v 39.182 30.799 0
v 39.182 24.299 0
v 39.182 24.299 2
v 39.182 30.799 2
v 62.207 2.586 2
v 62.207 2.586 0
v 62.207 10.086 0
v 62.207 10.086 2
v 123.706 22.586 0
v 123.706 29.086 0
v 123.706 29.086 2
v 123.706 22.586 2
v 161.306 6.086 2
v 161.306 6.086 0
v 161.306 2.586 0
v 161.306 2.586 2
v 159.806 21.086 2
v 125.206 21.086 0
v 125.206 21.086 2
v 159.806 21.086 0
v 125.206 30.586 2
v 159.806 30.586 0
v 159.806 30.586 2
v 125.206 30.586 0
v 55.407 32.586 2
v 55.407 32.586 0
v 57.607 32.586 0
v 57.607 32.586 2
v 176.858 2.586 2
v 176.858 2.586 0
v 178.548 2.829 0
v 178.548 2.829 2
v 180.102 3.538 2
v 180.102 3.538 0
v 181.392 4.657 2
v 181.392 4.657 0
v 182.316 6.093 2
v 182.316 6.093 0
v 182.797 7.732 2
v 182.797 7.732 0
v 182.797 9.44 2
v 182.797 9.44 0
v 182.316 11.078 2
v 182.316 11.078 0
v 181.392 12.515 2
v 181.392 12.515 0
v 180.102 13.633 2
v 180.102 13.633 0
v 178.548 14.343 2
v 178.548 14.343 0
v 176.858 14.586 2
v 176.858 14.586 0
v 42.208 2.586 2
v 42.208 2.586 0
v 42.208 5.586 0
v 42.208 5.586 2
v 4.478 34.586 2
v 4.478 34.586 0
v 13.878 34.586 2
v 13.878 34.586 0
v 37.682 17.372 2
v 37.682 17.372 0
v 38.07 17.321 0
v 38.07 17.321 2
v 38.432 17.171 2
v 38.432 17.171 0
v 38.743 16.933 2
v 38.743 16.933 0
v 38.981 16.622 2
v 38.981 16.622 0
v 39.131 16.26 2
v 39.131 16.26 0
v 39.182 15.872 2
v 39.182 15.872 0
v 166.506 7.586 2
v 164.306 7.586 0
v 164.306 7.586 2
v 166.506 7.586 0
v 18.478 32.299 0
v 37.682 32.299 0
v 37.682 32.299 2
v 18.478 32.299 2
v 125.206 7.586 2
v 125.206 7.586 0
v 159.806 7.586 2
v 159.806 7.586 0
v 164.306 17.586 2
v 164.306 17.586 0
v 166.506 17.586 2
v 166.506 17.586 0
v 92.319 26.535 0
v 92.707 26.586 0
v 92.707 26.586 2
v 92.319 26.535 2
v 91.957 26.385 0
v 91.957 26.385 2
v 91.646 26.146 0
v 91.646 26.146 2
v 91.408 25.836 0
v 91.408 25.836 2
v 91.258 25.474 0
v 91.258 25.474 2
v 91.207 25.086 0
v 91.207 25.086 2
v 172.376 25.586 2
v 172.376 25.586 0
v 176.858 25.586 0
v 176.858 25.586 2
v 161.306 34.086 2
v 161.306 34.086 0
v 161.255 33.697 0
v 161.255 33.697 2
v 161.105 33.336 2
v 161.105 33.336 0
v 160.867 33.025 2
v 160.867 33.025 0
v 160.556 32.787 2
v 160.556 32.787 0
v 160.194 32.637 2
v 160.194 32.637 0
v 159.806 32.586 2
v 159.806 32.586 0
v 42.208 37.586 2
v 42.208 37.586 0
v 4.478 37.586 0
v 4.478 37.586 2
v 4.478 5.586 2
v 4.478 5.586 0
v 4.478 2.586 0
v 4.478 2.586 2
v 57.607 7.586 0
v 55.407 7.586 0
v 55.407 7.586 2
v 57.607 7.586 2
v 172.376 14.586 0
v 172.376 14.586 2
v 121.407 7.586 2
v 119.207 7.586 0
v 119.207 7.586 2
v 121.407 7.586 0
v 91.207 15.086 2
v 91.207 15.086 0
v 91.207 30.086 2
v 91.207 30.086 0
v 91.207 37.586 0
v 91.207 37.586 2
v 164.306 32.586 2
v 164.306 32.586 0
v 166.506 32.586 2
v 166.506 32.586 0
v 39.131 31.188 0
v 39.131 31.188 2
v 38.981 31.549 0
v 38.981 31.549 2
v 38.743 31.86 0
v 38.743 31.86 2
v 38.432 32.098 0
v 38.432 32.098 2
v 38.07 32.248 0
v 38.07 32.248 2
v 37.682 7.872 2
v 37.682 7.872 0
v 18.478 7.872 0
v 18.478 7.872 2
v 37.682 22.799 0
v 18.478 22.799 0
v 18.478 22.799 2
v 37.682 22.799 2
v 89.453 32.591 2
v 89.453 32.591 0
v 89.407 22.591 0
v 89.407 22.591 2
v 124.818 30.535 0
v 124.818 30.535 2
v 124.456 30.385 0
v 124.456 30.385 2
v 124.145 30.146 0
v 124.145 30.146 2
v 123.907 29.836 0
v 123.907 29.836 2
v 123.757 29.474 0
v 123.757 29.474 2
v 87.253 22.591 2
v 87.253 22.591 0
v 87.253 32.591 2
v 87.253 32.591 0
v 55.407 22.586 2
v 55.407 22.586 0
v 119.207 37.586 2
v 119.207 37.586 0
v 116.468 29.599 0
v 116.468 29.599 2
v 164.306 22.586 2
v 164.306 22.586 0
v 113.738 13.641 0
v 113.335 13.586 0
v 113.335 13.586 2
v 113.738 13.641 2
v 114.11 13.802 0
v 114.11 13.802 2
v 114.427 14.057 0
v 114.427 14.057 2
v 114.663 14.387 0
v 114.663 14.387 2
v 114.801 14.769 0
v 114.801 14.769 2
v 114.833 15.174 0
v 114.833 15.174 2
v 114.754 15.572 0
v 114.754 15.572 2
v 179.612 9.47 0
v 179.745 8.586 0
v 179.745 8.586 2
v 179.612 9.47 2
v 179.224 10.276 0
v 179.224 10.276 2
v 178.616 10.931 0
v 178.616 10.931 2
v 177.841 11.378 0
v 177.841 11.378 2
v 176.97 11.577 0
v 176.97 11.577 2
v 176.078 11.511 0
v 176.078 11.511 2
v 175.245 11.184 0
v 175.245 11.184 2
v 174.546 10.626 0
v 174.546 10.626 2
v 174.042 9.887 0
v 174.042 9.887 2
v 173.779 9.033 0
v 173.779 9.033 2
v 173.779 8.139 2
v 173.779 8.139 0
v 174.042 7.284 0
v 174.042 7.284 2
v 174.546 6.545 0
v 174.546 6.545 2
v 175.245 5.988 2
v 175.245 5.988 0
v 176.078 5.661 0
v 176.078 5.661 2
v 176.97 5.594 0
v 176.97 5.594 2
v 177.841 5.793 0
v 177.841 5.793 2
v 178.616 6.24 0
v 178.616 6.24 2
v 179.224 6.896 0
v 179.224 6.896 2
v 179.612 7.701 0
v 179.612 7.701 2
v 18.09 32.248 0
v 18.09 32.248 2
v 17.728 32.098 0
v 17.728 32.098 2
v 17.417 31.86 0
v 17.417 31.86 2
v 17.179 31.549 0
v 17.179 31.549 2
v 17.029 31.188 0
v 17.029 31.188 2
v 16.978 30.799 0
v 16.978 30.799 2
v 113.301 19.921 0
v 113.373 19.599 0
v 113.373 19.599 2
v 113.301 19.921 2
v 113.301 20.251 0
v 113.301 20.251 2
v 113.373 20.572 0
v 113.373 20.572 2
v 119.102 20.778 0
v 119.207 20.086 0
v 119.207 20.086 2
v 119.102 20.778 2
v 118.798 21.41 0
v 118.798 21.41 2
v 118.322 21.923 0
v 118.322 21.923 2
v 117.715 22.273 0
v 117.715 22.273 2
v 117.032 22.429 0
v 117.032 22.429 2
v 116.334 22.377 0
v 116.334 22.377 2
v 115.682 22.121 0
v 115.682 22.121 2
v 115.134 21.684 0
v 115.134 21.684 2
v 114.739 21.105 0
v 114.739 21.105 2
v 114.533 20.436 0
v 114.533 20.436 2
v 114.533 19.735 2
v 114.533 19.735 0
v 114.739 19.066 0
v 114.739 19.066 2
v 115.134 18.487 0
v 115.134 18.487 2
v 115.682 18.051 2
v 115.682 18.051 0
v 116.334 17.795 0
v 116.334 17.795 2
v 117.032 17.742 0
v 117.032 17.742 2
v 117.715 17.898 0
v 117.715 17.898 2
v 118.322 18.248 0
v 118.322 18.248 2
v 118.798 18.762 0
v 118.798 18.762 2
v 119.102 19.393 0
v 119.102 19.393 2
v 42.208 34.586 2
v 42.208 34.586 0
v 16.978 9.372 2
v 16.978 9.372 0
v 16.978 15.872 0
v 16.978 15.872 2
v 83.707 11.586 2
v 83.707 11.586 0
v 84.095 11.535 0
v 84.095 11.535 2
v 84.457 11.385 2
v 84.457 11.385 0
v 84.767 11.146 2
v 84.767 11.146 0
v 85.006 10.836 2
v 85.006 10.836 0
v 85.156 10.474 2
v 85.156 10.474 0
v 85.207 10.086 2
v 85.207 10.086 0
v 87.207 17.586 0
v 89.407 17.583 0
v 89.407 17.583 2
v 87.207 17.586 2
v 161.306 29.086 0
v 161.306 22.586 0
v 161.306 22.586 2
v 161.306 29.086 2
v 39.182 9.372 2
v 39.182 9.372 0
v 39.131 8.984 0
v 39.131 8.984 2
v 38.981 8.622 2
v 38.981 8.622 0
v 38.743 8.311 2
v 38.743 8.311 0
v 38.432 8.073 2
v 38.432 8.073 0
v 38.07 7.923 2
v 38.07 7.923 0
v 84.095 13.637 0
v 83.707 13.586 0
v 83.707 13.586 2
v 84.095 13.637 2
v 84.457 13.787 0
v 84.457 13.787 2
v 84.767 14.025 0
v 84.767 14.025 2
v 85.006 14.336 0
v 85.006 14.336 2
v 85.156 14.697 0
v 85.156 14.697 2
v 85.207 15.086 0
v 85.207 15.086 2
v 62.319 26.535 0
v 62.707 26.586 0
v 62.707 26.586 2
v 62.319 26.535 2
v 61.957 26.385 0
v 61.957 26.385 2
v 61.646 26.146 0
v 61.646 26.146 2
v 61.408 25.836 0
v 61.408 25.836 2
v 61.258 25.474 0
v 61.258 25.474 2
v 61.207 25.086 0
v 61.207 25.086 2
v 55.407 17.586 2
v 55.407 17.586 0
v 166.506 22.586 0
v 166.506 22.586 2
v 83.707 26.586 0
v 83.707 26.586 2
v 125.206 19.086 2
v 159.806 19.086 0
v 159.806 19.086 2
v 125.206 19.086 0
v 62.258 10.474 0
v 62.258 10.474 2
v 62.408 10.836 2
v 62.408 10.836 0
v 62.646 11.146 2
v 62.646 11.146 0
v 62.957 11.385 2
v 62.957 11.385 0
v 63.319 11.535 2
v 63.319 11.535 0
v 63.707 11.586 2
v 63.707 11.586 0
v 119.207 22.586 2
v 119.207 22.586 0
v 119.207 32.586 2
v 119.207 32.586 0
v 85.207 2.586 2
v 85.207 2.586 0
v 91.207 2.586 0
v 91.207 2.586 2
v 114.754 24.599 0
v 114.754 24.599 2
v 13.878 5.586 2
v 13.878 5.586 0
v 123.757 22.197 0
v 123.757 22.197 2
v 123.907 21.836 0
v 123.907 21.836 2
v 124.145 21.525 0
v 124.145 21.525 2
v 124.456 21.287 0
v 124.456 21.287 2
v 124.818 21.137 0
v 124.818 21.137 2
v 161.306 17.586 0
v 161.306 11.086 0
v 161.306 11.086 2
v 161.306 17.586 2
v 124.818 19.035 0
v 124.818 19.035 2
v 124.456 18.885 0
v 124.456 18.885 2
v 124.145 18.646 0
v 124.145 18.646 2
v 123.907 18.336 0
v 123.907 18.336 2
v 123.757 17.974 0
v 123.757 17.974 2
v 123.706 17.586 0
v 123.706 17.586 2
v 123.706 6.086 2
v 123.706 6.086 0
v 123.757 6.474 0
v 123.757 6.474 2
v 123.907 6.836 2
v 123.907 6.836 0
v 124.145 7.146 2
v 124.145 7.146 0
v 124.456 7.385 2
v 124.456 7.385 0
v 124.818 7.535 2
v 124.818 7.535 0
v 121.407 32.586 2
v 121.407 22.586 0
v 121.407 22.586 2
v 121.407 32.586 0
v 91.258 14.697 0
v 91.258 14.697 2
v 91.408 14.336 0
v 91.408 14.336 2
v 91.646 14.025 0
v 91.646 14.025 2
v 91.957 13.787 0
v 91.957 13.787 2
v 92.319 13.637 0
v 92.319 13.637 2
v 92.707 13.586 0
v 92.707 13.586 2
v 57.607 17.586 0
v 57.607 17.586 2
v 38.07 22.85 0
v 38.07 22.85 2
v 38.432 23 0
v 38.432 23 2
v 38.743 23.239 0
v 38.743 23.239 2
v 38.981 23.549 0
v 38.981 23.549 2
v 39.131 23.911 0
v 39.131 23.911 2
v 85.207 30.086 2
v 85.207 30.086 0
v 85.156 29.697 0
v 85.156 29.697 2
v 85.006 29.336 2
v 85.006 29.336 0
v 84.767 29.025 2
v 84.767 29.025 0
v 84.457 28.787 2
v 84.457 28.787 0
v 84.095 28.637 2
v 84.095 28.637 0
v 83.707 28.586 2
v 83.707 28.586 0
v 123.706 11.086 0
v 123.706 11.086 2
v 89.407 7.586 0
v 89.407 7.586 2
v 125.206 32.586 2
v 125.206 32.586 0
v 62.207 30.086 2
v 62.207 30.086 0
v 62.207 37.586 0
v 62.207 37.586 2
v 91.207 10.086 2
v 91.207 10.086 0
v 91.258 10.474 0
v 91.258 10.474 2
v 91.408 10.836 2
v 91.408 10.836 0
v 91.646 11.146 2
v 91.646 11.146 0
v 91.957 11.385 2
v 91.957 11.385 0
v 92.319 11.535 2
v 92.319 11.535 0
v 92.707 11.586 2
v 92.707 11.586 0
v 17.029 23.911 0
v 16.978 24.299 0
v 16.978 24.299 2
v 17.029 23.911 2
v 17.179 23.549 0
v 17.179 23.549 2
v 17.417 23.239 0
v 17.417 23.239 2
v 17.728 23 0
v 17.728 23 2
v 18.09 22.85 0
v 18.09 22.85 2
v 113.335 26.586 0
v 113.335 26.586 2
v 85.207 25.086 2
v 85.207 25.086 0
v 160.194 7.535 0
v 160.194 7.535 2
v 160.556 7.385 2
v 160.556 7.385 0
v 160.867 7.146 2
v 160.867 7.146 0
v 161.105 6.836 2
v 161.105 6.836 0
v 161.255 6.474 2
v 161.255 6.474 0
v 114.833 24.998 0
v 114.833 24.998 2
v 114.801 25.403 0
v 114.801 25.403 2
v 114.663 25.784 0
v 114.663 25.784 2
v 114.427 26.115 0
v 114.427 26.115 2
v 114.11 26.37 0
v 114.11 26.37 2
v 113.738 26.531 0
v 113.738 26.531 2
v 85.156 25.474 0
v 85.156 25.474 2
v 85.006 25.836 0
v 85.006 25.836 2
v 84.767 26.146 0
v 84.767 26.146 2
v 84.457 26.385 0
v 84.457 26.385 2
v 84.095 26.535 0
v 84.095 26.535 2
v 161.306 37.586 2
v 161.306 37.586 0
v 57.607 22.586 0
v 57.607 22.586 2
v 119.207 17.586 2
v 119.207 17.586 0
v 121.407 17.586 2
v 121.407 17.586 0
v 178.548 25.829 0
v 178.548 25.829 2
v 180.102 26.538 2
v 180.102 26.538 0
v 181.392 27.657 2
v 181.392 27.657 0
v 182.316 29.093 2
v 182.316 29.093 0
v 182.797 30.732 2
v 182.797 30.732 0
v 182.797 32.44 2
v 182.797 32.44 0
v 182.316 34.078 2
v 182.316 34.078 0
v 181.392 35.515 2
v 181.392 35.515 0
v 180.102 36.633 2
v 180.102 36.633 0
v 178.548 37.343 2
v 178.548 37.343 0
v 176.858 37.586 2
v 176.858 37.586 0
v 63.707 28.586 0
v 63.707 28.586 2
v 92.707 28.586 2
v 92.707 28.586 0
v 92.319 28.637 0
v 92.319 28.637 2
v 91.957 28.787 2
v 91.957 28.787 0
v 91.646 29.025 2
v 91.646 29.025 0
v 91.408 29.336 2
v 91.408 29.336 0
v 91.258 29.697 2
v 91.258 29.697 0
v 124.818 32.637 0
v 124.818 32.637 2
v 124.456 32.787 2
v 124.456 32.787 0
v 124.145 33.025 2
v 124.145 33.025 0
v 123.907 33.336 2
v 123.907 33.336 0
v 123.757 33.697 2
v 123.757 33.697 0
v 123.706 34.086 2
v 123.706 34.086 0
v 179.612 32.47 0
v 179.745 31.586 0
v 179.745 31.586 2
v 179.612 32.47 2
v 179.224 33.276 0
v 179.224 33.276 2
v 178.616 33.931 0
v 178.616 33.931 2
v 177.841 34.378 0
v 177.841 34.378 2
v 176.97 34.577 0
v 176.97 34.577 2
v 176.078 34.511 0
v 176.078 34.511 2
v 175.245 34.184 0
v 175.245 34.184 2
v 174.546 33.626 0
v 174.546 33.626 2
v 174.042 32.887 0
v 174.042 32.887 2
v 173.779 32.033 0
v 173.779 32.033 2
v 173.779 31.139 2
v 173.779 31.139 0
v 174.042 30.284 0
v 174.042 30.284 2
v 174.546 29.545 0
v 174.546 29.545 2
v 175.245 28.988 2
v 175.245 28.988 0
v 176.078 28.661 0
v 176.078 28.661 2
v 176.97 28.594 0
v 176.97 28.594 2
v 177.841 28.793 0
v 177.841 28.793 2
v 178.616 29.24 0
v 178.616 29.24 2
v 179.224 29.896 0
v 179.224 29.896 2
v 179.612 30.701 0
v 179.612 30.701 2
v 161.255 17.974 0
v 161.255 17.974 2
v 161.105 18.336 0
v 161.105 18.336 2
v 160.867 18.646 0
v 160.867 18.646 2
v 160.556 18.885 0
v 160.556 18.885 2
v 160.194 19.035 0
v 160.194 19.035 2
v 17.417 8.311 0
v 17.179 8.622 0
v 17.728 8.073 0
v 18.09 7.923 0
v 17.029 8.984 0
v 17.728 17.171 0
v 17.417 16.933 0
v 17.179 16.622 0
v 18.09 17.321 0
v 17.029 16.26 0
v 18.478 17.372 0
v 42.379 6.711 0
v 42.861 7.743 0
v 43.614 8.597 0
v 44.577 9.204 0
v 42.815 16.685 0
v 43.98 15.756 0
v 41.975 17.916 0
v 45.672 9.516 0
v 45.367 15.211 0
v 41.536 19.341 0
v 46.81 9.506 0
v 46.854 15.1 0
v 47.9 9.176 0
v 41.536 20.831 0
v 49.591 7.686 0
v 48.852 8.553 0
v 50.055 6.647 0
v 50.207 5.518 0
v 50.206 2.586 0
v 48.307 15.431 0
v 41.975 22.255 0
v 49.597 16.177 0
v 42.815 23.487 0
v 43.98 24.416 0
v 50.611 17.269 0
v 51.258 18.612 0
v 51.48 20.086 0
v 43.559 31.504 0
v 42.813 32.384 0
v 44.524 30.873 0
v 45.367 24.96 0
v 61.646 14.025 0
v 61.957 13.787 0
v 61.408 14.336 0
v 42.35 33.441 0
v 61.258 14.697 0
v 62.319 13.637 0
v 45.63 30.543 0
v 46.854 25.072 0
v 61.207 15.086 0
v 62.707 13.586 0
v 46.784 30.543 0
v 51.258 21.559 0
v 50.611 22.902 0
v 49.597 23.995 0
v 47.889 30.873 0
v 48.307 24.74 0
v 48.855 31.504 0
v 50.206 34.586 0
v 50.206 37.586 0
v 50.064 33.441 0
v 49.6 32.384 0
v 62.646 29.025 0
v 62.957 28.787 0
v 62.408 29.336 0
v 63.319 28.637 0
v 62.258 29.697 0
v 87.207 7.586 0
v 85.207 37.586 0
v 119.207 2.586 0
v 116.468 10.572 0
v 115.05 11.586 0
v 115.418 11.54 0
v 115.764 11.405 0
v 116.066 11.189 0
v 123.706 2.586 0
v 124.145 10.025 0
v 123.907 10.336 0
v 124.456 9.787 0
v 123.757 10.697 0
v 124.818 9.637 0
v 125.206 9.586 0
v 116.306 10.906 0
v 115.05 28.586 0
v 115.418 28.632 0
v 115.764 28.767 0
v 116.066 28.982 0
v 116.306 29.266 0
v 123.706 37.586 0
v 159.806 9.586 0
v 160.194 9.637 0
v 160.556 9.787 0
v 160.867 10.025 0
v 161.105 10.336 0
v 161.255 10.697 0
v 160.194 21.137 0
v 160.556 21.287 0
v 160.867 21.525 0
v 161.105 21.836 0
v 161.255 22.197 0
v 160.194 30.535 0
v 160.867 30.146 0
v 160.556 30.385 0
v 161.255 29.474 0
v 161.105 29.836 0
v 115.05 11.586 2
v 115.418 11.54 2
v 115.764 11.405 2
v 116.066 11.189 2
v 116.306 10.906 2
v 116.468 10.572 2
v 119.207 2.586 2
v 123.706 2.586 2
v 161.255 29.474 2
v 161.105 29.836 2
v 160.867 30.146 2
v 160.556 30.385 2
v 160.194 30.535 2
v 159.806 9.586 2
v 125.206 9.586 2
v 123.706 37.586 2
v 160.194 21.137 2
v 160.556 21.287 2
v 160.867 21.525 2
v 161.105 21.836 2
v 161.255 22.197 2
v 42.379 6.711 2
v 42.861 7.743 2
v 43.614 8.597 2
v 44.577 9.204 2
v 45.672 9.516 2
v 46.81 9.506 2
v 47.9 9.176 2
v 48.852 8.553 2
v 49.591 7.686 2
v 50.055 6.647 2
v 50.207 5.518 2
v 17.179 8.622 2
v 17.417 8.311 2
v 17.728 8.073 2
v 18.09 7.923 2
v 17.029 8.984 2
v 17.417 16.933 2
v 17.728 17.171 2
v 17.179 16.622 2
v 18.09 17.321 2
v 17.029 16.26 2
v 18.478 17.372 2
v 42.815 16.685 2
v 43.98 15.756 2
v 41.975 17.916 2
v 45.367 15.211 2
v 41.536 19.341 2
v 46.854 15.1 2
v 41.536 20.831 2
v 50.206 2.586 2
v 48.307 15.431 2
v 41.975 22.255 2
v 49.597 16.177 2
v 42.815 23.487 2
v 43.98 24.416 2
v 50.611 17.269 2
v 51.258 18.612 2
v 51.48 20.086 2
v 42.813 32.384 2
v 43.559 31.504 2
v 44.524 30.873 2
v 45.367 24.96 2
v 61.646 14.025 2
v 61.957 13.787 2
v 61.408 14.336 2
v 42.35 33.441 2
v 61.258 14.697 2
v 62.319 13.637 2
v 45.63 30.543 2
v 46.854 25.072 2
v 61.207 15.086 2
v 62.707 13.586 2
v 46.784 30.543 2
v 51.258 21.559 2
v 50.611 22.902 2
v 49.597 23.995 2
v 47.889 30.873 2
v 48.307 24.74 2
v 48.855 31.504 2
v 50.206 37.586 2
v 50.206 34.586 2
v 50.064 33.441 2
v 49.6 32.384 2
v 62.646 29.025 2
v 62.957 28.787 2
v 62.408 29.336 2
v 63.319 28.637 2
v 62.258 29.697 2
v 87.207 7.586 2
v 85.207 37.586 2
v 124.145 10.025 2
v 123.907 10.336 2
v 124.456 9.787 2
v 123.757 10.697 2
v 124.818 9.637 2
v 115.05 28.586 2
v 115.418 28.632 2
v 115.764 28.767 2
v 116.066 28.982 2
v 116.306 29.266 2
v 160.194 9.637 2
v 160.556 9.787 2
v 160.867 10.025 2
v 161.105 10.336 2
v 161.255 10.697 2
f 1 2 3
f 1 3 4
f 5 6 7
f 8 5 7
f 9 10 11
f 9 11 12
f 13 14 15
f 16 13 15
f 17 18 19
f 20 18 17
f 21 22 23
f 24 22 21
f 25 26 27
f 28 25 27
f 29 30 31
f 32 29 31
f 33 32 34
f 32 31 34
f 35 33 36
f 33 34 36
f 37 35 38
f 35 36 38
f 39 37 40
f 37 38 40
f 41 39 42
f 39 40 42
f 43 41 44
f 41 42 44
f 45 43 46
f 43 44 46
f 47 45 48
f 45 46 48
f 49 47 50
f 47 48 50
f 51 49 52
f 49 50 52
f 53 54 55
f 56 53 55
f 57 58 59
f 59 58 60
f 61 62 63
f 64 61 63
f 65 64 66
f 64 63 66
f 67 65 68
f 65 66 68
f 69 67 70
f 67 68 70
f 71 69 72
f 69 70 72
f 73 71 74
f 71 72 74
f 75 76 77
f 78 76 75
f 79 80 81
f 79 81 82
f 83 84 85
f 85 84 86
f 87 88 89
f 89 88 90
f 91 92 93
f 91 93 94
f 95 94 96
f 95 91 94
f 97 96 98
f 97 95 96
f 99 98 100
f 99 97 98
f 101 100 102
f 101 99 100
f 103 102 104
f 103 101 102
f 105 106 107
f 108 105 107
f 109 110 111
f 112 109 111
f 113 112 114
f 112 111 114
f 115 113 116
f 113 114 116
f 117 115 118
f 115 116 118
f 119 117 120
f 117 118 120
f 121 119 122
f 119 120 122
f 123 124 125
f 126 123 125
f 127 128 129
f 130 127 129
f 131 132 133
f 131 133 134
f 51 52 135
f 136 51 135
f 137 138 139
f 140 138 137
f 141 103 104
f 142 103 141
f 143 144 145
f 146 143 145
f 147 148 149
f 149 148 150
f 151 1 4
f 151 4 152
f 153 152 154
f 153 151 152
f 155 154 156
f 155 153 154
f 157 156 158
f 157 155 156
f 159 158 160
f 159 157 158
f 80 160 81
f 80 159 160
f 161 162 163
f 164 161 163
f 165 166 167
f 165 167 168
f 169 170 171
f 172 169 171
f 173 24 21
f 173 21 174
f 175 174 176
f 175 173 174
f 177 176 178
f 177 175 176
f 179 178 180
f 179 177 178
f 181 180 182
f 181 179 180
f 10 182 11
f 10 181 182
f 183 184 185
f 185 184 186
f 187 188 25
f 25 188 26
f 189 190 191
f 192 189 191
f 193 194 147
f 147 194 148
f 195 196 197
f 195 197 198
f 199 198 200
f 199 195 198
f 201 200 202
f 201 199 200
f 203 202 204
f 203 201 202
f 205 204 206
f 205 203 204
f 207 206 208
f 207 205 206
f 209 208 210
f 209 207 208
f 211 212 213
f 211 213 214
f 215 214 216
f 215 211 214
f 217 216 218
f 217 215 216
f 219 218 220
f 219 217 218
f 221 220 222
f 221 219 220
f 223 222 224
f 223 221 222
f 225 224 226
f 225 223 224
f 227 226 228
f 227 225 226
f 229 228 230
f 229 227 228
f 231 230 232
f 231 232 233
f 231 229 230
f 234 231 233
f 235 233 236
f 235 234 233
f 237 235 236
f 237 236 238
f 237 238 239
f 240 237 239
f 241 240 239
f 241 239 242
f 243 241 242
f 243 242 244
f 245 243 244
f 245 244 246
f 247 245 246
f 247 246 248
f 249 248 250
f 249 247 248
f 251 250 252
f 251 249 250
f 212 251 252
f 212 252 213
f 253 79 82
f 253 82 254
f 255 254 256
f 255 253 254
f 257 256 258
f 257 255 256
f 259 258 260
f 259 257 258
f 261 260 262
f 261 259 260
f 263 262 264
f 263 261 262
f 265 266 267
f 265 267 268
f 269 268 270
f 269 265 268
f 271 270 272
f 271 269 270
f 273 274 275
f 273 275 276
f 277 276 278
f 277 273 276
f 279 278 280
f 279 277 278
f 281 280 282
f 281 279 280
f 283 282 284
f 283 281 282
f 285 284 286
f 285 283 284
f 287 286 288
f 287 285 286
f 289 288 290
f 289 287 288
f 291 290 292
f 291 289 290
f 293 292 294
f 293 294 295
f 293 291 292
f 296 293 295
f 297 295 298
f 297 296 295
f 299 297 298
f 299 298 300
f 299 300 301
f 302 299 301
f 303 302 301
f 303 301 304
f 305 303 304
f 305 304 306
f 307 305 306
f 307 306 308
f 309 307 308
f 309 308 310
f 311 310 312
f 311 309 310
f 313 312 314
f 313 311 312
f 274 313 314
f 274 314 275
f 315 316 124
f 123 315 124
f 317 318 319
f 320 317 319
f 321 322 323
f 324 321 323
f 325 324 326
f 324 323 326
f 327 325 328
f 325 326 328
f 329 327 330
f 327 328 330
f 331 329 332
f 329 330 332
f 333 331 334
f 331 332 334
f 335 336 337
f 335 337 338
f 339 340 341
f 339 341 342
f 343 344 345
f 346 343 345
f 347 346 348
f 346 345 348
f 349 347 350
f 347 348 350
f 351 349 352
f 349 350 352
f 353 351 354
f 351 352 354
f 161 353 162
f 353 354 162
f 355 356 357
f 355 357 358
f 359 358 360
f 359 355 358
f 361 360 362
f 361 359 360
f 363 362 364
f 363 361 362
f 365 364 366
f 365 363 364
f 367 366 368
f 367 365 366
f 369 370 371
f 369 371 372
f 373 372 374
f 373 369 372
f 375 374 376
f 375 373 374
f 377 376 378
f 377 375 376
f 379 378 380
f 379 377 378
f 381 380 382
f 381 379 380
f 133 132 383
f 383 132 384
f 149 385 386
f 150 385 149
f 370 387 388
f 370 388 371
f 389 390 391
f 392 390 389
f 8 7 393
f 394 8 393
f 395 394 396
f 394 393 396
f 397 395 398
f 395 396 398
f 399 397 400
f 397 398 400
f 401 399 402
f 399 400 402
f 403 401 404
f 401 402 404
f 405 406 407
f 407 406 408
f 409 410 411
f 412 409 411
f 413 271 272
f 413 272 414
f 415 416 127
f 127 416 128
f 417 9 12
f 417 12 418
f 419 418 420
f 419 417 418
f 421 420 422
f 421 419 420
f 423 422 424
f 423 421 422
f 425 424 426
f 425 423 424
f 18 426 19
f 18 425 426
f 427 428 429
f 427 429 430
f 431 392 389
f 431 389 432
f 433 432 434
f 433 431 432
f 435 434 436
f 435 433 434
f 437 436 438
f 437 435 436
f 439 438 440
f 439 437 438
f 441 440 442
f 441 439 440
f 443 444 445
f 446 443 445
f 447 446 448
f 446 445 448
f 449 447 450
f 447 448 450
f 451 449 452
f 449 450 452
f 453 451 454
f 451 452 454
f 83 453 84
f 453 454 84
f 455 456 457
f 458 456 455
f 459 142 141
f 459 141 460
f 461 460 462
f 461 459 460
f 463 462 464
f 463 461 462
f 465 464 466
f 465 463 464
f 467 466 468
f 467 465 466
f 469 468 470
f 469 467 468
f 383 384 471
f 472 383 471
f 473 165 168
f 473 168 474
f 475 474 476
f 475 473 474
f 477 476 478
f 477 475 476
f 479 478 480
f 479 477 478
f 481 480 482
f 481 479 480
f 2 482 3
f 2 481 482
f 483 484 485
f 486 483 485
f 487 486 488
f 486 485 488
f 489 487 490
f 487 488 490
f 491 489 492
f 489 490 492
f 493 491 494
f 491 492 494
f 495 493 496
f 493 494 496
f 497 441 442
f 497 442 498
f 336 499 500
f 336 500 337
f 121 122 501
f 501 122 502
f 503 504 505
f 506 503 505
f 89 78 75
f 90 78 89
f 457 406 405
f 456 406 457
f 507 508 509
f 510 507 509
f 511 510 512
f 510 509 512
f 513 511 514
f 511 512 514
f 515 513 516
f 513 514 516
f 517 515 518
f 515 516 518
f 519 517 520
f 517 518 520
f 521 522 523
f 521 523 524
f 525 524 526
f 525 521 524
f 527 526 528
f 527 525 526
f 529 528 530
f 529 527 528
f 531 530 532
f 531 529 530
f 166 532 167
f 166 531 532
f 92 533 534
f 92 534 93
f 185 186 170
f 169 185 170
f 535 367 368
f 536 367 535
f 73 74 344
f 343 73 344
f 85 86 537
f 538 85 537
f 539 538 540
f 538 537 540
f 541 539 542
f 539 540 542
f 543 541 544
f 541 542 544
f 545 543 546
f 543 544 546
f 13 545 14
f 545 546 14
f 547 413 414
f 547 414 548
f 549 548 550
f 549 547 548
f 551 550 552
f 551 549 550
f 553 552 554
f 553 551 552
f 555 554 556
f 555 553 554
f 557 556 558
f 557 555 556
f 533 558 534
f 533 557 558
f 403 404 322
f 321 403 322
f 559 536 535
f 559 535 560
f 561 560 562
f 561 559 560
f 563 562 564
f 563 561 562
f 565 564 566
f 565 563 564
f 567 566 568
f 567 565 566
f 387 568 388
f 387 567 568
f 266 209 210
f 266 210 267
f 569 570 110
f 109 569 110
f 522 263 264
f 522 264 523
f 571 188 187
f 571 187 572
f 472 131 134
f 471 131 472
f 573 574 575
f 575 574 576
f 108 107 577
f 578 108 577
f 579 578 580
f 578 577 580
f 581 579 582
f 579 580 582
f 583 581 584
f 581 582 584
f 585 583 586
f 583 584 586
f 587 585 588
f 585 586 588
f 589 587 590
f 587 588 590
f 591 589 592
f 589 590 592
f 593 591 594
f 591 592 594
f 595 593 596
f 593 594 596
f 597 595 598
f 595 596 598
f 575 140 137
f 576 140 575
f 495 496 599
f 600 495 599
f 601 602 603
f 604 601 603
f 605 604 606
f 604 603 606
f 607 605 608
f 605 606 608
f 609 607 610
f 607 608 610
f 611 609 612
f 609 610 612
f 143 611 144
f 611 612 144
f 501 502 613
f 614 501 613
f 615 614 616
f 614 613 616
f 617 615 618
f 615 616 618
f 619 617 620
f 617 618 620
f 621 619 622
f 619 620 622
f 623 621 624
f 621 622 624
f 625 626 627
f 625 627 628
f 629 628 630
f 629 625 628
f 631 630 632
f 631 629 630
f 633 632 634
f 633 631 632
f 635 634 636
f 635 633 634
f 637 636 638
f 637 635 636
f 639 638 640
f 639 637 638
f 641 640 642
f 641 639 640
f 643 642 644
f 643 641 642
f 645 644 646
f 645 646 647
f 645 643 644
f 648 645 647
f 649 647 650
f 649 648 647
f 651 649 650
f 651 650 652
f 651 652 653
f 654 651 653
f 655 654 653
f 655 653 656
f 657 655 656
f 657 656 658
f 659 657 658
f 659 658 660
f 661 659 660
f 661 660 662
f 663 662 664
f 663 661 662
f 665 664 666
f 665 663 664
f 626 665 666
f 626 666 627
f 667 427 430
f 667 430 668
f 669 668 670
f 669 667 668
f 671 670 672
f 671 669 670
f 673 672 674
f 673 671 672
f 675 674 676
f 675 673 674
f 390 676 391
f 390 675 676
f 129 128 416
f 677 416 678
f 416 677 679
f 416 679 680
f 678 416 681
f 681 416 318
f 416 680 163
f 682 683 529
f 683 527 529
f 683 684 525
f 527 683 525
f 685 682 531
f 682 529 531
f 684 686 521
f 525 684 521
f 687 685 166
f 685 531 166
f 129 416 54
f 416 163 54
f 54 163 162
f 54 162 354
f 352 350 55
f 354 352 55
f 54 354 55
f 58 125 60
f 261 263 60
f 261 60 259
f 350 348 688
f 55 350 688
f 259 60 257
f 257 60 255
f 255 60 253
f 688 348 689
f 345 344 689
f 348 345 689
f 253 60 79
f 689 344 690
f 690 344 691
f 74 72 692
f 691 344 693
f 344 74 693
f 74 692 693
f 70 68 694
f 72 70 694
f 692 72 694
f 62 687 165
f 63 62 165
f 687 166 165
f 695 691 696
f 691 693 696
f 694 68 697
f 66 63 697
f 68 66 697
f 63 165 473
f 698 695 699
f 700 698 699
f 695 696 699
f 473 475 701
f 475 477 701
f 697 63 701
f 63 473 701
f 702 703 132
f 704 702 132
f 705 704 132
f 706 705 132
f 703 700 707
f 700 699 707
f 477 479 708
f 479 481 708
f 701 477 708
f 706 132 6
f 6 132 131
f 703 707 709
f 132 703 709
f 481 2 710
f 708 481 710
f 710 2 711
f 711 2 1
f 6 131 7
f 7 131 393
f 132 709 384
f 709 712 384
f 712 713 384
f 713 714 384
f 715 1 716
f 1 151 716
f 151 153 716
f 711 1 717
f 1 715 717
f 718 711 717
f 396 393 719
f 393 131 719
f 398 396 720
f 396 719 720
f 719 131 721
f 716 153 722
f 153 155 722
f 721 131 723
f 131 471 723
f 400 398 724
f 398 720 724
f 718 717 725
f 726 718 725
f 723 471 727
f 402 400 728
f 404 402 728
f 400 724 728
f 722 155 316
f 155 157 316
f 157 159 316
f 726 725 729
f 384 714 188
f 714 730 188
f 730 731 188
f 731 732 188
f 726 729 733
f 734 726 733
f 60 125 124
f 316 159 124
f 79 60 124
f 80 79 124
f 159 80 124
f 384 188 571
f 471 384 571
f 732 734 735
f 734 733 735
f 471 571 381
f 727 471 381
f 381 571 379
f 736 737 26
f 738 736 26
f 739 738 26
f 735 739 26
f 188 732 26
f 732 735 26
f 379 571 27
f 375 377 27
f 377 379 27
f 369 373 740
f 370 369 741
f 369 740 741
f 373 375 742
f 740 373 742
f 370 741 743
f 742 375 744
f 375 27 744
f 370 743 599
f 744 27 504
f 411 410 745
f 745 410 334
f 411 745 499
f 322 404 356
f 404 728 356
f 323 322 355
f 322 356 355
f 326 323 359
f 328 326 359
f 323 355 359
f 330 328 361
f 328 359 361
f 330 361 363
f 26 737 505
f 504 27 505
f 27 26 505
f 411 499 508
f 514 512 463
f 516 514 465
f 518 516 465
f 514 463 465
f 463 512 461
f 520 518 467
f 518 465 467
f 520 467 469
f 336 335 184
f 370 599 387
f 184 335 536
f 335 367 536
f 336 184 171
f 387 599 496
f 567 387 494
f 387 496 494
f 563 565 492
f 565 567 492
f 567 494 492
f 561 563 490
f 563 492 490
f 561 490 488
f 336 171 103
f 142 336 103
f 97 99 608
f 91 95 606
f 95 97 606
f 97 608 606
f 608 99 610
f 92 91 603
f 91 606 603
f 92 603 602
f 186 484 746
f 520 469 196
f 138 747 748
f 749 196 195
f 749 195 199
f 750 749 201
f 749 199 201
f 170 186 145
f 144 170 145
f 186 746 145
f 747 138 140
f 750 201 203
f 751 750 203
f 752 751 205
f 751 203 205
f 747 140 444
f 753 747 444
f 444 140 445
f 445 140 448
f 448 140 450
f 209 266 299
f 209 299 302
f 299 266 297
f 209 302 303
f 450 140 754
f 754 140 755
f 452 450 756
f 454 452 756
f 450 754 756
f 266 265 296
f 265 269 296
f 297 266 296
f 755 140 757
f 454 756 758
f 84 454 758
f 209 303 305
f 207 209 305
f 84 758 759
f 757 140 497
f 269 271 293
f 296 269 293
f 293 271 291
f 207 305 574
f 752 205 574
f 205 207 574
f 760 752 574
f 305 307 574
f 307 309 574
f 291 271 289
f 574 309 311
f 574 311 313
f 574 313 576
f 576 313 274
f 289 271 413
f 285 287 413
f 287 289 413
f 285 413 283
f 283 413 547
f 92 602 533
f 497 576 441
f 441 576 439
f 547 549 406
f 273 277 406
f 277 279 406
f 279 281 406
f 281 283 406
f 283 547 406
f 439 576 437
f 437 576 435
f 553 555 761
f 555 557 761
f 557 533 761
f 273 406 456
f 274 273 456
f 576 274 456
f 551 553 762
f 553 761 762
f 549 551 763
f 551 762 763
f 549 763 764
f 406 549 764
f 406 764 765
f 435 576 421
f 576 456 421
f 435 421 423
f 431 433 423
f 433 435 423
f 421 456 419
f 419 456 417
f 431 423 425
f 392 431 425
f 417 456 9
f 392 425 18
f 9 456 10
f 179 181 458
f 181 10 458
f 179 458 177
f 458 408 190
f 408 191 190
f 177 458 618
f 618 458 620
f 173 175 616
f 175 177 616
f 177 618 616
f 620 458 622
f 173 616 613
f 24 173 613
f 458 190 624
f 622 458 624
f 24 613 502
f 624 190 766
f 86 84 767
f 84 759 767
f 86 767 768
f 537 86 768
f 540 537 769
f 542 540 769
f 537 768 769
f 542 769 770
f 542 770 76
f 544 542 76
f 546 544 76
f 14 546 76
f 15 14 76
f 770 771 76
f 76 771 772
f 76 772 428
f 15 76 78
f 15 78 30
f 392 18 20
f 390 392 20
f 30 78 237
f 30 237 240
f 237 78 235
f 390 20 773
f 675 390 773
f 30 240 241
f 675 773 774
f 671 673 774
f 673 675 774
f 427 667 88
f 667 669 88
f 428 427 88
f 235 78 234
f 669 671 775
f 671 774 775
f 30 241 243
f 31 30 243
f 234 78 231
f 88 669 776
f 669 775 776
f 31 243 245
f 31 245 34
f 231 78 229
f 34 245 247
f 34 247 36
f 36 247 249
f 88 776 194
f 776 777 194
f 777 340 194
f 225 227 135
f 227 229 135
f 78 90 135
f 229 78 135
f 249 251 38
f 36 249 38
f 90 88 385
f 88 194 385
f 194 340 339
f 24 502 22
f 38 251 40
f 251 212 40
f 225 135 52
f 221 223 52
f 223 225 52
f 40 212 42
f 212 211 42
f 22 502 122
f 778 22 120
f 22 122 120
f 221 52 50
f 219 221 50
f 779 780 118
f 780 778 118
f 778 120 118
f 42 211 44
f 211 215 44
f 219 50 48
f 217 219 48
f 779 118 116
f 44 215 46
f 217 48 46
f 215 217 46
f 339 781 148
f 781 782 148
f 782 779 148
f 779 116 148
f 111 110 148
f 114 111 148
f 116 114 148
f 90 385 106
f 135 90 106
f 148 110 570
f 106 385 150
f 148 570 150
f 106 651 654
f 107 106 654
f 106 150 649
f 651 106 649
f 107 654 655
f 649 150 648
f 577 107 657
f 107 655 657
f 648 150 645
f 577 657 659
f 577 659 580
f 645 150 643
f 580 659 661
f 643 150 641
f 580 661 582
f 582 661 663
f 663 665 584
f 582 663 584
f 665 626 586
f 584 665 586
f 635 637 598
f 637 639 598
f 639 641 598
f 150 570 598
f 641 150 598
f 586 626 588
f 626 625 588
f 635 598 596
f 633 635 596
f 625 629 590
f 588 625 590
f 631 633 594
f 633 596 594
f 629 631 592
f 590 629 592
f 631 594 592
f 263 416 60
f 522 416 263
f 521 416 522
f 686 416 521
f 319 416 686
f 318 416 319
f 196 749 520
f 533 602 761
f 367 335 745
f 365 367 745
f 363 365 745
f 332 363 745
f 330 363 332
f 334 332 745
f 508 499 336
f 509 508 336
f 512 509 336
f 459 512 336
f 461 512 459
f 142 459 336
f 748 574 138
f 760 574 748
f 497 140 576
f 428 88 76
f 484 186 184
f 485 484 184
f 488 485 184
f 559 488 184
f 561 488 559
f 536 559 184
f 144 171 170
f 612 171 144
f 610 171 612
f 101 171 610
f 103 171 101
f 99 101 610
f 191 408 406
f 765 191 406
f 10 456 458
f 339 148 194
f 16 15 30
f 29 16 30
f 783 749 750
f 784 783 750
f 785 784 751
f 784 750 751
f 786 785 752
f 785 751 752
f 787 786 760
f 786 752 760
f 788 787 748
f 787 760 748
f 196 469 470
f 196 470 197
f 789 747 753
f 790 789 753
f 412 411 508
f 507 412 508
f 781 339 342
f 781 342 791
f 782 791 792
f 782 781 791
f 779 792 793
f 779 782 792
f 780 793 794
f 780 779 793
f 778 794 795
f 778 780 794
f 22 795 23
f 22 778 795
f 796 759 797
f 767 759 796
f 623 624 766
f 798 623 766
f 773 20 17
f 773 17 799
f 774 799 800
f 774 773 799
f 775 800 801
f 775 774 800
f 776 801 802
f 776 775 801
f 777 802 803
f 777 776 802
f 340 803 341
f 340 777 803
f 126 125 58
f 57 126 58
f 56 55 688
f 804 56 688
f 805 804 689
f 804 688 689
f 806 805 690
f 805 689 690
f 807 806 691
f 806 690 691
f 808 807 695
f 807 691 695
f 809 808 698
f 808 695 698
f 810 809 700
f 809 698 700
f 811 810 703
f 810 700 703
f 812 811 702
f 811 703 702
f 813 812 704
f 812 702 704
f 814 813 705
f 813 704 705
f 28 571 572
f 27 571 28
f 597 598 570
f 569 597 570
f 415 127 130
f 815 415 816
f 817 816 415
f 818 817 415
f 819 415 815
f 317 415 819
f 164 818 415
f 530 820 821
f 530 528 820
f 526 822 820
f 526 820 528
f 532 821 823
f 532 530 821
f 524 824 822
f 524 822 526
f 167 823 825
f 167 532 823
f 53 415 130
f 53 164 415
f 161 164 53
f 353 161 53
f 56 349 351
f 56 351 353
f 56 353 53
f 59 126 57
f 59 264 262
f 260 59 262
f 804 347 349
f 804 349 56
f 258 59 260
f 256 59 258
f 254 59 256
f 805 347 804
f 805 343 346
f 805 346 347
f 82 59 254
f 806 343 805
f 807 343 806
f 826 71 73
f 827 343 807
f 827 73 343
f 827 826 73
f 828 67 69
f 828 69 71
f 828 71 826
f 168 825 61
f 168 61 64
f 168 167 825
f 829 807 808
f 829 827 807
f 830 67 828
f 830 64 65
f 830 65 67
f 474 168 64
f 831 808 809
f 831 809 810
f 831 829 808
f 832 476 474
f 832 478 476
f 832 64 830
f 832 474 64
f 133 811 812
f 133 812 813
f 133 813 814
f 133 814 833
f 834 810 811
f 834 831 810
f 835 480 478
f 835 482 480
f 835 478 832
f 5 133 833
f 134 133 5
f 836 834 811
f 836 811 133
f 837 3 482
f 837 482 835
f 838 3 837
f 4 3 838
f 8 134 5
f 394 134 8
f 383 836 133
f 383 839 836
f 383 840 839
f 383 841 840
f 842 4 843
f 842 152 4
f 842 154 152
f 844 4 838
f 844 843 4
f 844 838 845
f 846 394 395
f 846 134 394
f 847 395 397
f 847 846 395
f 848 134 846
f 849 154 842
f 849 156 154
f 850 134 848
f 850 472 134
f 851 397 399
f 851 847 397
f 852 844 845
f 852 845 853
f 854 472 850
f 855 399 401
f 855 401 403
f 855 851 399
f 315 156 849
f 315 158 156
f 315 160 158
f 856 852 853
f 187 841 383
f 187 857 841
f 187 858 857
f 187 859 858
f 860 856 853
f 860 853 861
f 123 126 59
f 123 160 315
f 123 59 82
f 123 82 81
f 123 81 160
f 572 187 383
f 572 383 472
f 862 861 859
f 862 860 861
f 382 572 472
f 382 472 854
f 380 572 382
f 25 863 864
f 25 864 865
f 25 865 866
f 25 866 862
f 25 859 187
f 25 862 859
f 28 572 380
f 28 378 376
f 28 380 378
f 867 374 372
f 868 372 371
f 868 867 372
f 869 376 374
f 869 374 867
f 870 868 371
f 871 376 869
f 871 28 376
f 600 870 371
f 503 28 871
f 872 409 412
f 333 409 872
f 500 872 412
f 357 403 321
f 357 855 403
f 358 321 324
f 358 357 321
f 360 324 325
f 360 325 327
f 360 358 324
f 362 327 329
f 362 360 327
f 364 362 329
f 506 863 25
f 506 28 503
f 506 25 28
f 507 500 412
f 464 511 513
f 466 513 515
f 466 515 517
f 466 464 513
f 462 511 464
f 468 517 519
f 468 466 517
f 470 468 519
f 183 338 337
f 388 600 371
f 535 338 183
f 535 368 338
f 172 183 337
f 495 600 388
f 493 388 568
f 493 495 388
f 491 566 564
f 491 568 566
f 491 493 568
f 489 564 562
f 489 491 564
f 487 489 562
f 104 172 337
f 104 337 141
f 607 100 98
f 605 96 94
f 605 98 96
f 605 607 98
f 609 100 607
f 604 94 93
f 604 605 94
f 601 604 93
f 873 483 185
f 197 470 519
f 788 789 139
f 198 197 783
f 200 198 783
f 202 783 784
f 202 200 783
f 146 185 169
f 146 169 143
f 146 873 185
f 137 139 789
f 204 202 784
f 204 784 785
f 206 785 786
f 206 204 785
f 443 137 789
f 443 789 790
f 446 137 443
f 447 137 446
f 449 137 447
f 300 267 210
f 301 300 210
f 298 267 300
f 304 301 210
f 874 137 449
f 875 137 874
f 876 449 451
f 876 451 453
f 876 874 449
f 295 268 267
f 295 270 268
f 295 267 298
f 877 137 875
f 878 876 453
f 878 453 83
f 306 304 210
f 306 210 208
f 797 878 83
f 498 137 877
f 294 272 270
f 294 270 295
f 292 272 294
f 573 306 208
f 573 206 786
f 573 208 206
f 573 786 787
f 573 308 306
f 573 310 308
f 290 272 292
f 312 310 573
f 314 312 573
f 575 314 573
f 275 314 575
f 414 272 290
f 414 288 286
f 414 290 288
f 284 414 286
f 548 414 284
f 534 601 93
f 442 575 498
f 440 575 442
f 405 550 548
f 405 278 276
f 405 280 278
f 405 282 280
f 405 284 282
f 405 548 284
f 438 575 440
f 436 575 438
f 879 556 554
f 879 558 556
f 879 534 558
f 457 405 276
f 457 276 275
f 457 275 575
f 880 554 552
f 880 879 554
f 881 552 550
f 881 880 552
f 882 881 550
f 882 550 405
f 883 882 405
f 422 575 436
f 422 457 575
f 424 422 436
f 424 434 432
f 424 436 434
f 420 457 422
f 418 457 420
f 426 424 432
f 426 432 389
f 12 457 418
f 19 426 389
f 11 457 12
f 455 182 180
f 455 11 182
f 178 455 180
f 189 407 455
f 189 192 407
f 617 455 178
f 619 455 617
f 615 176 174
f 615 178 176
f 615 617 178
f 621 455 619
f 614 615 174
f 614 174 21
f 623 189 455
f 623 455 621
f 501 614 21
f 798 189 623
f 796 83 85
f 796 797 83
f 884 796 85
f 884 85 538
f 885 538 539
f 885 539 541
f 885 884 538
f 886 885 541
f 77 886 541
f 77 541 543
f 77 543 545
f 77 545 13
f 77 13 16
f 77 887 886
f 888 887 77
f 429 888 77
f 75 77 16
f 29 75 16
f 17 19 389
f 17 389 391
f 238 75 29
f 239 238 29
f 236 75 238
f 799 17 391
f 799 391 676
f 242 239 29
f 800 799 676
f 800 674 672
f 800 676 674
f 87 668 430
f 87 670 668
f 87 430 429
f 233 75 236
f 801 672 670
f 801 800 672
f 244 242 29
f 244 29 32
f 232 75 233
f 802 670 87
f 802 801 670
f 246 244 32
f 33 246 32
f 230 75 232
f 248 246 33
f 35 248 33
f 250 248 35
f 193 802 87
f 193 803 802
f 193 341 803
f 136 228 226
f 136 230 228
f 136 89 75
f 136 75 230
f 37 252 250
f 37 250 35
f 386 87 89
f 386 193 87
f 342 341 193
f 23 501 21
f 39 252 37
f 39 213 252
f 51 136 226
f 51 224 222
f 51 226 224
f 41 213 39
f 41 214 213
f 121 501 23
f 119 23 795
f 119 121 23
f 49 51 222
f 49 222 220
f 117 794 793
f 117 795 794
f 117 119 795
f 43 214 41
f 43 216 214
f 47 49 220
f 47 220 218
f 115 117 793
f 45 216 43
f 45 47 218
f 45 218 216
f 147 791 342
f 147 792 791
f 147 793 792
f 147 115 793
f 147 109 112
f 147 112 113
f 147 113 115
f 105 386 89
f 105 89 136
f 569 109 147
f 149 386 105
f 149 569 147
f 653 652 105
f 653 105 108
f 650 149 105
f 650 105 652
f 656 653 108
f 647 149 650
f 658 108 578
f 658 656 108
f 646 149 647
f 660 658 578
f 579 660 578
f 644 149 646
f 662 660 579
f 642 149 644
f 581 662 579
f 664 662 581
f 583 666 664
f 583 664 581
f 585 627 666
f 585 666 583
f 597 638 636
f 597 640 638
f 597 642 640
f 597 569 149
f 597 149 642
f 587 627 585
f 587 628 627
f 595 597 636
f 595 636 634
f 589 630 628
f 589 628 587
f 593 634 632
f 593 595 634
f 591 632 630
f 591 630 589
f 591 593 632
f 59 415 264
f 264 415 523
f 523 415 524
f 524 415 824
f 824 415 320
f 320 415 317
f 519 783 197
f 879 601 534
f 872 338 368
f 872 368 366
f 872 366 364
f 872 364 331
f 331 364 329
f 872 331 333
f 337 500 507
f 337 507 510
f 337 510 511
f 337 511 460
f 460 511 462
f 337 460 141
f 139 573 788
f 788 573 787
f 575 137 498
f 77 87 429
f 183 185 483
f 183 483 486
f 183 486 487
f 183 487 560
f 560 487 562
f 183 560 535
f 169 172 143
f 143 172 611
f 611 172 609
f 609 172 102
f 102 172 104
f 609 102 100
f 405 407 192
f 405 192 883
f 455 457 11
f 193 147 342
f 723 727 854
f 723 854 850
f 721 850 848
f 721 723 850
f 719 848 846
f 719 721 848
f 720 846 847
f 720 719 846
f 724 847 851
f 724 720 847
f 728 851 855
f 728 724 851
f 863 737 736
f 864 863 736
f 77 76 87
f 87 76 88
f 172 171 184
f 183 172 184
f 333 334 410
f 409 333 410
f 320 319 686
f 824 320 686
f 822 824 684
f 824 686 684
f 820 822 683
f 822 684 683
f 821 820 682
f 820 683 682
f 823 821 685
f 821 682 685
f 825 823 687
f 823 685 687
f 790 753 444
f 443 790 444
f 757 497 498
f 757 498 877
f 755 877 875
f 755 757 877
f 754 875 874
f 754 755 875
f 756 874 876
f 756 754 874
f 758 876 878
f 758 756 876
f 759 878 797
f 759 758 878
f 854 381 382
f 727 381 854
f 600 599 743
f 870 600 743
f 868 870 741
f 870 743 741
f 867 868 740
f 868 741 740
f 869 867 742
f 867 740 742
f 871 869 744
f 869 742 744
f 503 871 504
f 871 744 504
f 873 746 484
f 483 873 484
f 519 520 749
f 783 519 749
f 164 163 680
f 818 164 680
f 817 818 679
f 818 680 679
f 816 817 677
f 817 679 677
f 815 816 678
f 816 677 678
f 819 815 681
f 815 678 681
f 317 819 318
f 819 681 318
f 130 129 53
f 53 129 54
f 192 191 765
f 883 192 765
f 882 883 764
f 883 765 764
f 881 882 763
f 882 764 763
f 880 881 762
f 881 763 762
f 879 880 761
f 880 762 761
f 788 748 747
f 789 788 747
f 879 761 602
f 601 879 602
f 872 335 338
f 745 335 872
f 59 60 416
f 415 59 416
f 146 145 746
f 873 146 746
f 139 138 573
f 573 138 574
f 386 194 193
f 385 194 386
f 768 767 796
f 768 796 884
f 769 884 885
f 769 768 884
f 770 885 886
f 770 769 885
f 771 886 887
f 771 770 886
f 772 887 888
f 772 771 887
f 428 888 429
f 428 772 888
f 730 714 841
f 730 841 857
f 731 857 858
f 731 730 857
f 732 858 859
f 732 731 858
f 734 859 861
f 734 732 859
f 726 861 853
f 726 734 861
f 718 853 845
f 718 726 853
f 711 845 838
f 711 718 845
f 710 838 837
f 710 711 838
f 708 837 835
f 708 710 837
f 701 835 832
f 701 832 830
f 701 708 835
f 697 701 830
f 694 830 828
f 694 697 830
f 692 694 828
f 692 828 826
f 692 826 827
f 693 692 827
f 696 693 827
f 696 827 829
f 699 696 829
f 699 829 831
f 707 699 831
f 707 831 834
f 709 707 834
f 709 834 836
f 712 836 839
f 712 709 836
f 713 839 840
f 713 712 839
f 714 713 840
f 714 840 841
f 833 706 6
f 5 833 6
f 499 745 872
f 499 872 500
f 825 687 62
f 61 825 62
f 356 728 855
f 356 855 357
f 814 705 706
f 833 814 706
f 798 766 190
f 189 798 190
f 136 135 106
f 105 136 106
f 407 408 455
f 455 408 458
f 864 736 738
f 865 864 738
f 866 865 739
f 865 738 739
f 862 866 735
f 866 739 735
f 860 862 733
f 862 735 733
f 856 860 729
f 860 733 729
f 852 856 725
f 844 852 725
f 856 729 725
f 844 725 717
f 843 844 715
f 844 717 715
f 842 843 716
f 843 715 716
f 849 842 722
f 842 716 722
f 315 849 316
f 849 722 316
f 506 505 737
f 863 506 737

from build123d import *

# Parameters (mm, degrees)
MODEL_R         = 3
MODEL_R_2       = 2.35
MODEL_R_3       = 5
MODEL_W         = 2.2
MODEL_H         = 10
EXTRUDE_1_DEPTH = 2


with BuildPart() as part:
    # Model → 凸台-拉伸1 (new body)
    with BuildSketch(Plane.XY):
        with BuildLine():
            Line((42.207834759, 34.585721775), (42.207834759, 37.585721775))
            Line((42.207834759, 37.585721775), (4.478222617, 37.585721775))
            Line((4.478222617, 37.585721775), (4.478222617, 34.585721775))
            Line((4.478222617, 34.585721775), (13.878222617, 34.585721775))
            Line((13.878222617, 34.585721775), (13.878222617, 5.585721775))
            Line((13.878222617, 5.585721775), (4.478222617, 5.585721775))
            Line((4.478222617, 5.585721775), (4.478222617, 2.585721775))
            Line((4.478222617, 2.585721775), (42.207834759, 2.585721775))
            Line((42.207834759, 2.585721775), (42.207834759, 5.585721775))
            ThreePointArc((42.207834759, 5.585721775), (46.241179833, 9.551811246), (50.207269305, 5.518466173))
            Line((50.207269305, 5.518466173), (50.205774509, 2.585721775))
            Line((50.205774509, 2.585721775), (62.206804634, 2.585721775))
            Line((62.206804634, 2.585721775), (62.206804634, 10.085721775))
            ThreePointArc((62.206804634, 10.085721775), (62.646144463, 11.146381946), (63.706804634, 11.585721775))
            Line((63.706804634, 11.585721775), (83.706804634, 11.585721775))
            ThreePointArc((83.706804634, 11.585721775), (84.767464806, 11.146381946), (85.206804634, 10.085721775))
            Line((85.206804634, 10.085721775), (85.206804634, 2.585721775))
            Line((85.206804634, 2.585721775), (91.206804634, 2.585721775))
            Line((91.206804634, 2.585721775), (91.206804634, 10.085721775))
            ThreePointArc((91.206804634, 10.085721775), (91.646144463, 11.146381946), (92.706804634, 11.585721775))
            Line((92.706804634, 11.585721775), (115.049506416, 11.585721775))
            ThreePointArc((115.049506416, 11.585721775), (115.921363706, 11.306321981), (116.468425335, 10.572208261))
            Line((116.468425335, 10.572208261), (119.206649273, 2.585721775))
            Line((119.206649273, 2.585721775), (123.706021861, 2.585721775))
            Line((123.706021861, 2.585721775), (123.706021861, 6.085721775))
            ThreePointArc((123.706021861, 6.085721775), (124.145361689, 7.146381946), (125.206021861, 7.585721775))
            Line((125.206021861, 7.585721775), (159.806021861, 7.585721775))
            ThreePointArc((159.806021861, 7.585721775), (160.866682033, 7.146381946), (161.306021861, 6.085721775))
            Line((161.306021861, 6.085721775), (161.306021861, 2.585721775))
            Line((161.306021861, 2.585721775), (176.857875106, 2.585721775))
            ThreePointArc((176.857875106, 2.585721775), (182.857875106, 8.585721775), (176.857875106, 14.585721775))
            Line((176.857875106, 14.585721775), (172.375964349, 14.585721775))
            Line((172.375964349, 14.585721775), (172.375964349, 25.585721775))
            Line((172.375964349, 25.585721775), (176.857875106, 25.585721775))
            ThreePointArc((176.857875106, 25.585721775), (182.857875106, 31.585721775), (176.857875106, 37.585721775))
            Line((176.857875106, 37.585721775), (161.306021861, 37.585721775))
            Line((161.306021861, 37.585721775), (161.306021861, 34.085721775))
            ThreePointArc((161.306021861, 34.085721775), (160.866682033, 33.025061603), (159.806021861, 32.585721775))
            Line((159.806021861, 32.585721775), (125.206021861, 32.585721775))
            ThreePointArc((125.206021861, 32.585721775), (124.145361689, 33.025061603), (123.706021861, 34.085721775))
            Line((123.706021861, 34.085721775), (123.706021861, 37.585721775))
            Line((123.706021861, 37.585721775), (119.206649273, 37.585721775))
            Line((119.206649273, 37.585721775), (116.468425335, 29.599235288))
            ThreePointArc((116.468425335, 29.599235288), (115.921363706, 28.865121568), (115.049506416, 28.585721775))
            Line((115.049506416, 28.585721775), (92.706804634, 28.585721775))
            ThreePointArc((92.706804634, 28.585721775), (91.646144463, 29.025061603), (91.206804634, 30.085721775))
            Line((91.206804634, 30.085721775), (91.206804634, 37.585721775))
            Line((91.206804634, 37.585721775), (85.206804634, 37.585721775))
            Line((85.206804634, 37.585721775), (85.206804634, 30.085721775))
            ThreePointArc((85.206804634, 30.085721775), (84.767464806, 29.025061603), (83.706804634, 28.585721775))
            Line((83.706804634, 28.585721775), (63.706804634, 28.585721775))
            ThreePointArc((63.706804634, 28.585721775), (62.646144463, 29.025061603), (62.206804634, 30.085721775))
            Line((62.206804634, 30.085721775), (62.206804634, 37.585721775))
            Line((62.206804634, 37.585721775), (50.205774509, 37.585721775))
            Line((50.205774509, 37.585721775), (50.205774509, 34.585721775))
            ThreePointArc((50.205774509, 34.585721775), (46.206804634, 30.501548086), (42.207834759, 34.585721775))
        make_face()
        with Locations((176.745324773, 8.585721775)):
            Circle(MODEL_R, mode=Mode.SUBTRACT)
        with Locations((176.745324773, 31.585721775)):
            Circle(MODEL_R, mode=Mode.SUBTRACT)
        with Locations((116.856649273, 20.085721775)):
            Circle(MODEL_R_2, mode=Mode.SUBTRACT)
        with Locations((46.479868031, 20.085721775)):
            Circle(MODEL_R_3, mode=Mode.SUBTRACT)
        with BuildLine():
            Line((161.306021861, 22.585721775), (161.306021861, 29.085721775))
            ThreePointArc((161.306021861, 29.085721775), (160.866682033, 30.146381946), (159.806021861, 30.585721775))
            Line((159.806021861, 30.585721775), (125.206021861, 30.585721775))
            ThreePointArc((125.206021861, 30.585721775), (124.145361689, 30.146381946), (123.706021861, 29.085721775))
            Line((123.706021861, 29.085721775), (123.706021861, 22.585721775))
            ThreePointArc((123.706021861, 22.585721775), (124.145361689, 21.525061603), (125.206021861, 21.085721775))
            Line((125.206021861, 21.085721775), (159.806021861, 21.085721775))
            ThreePointArc((159.806021861, 21.085721775), (160.866682033, 21.525061603), (161.306021861, 22.585721775))
        make_face(mode=Mode.SUBTRACT)
        with BuildLine():
            Line((123.706021861, 17.585721775), (123.706021861, 11.085721775))
            ThreePointArc((123.706021861, 11.085721775), (124.145361689, 10.025061603), (125.206021861, 9.585721775))
            Line((125.206021861, 9.585721775), (159.806021861, 9.585721775))
            ThreePointArc((159.806021861, 9.585721775), (160.866682033, 10.025061603), (161.306021861, 11.085721775))
            Line((161.306021861, 11.085721775), (161.306021861, 17.585721775))
            ThreePointArc((161.306021861, 17.585721775), (160.866682033, 18.646381946), (159.806021861, 19.085721775))
            Line((159.806021861, 19.085721775), (125.206021861, 19.085721775))
            ThreePointArc((125.206021861, 19.085721775), (124.145361689, 18.646381946), (123.706021861, 17.585721775))
        make_face(mode=Mode.SUBTRACT)
        with Locations((56.506804634, 12.585721775)):
            Rectangle(MODEL_W, MODEL_H, mode=Mode.SUBTRACT)
        with Locations((56.506804634, 27.585721775)):
            Rectangle(MODEL_W, MODEL_H, mode=Mode.SUBTRACT)
        with Locations((165.406021861, 12.585721775)):
            Rectangle(MODEL_W, MODEL_H, mode=Mode.SUBTRACT)
        with Locations((165.406021861, 27.585721775)):
            Rectangle(MODEL_W, MODEL_H, mode=Mode.SUBTRACT)
        with Locations((120.306649273, 12.585721775)):
            Rectangle(MODEL_W, MODEL_H, mode=Mode.SUBTRACT)
        with Locations((120.306649273, 27.585721775)):
            Rectangle(MODEL_W, MODEL_H, mode=Mode.SUBTRACT)
        Polygon((87.206804634, 7.585721775), (89.406804634, 7.585721775), (89.406791039, 17.583389823), (87.206804634, 17.585721775), align=None, mode=Mode.SUBTRACT)
        Polygon((87.253377966, 32.591005683), (89.453377966, 32.591005683), (89.406734823, 22.591005683), (87.253377966, 22.591005683), align=None, mode=Mode.SUBTRACT)
        with BuildLine():
            Line((62.706804634, 13.585721775), (83.706804634, 13.585721775))
            ThreePointArc((83.706804634, 13.585721775), (84.767464806, 14.025061603), (85.206804634, 15.085721775))
            Line((85.206804634, 15.085721775), (85.206804634, 25.085721775))
            ThreePointArc((85.206804634, 25.085721775), (84.767464806, 26.146381946), (83.706804634, 26.585721775))
            Line((83.706804634, 26.585721775), (62.706804634, 26.585721775))
            ThreePointArc((62.706804634, 26.585721775), (61.646144463, 26.146381946), (61.206804634, 25.085721775))
            Line((61.206804634, 25.085721775), (61.206804634, 15.085721775))
            ThreePointArc((61.206804634, 15.085721775), (61.646144463, 14.025061603), (62.706804634, 13.585721775))
        make_face(mode=Mode.SUBTRACT)
        with BuildLine():
            Line((113.335220701, 26.585721775), (92.706804634, 26.585721775))
            ThreePointArc((92.706804634, 26.585721775), (91.646144463, 26.146381946), (91.206804634, 25.085721775))
            Line((91.206804634, 25.085721775), (91.206804634, 15.085721775))
            ThreePointArc((91.206804634, 15.085721775), (91.646144463, 14.025061603), (92.706804634, 13.585721775))
            Line((92.706804634, 13.585721775), (113.335220701, 13.585721775))
            ThreePointArc((113.335220701, 13.585721775), (114.555820908, 14.213864484), (114.75413962, 15.572208261))
            Line((114.75413962, 15.572208261), (113.37344464, 19.599235288))
            ThreePointArc((113.37344464, 19.599235288), (113.292363558, 20.085721775), (113.37344464, 20.572208261))
            Line((113.37344464, 20.572208261), (114.75413962, 24.599235288))
            ThreePointArc((114.75413962, 24.599235288), (114.555820908, 25.957579065), (113.335220701, 26.585721775))
        make_face(mode=Mode.SUBTRACT)
        with BuildLine():
            Line((18.477950078, 22.799320708), (37.681937895, 22.799320708))
            ThreePointArc((37.681937895, 22.799320708), (38.742598067, 23.238660536), (39.181937895, 24.299320708))
            Line((39.181937895, 24.299320708), (39.181937895, 30.799320708))
            ThreePointArc((39.181937895, 30.799320708), (38.742598067, 31.859980879), (37.681937895, 32.299320708))
            Line((37.681937895, 32.299320708), (18.477950078, 32.299320708))
            ThreePointArc((18.477950078, 32.299320708), (17.417289906, 31.859980879), (16.977950078, 30.799320708))
            Line((16.977950078, 30.799320708), (16.977950078, 24.299320708))
            ThreePointArc((16.977950078, 24.299320708), (17.417289906, 23.238660536), (18.477950078, 22.799320708))
        make_face(mode=Mode.SUBTRACT)
        with BuildLine():
            Line((18.477950078, 17.372122842), (37.681937895, 17.372122842))
            ThreePointArc((37.681937895, 17.372122842), (38.742598067, 16.932783014), (39.181937895, 15.872122842))
            Line((39.181937895, 15.872122842), (39.181937895, 9.372122842))
            ThreePointArc((39.181937895, 9.372122842), (38.742598067, 8.31146267), (37.681937895, 7.872122842))
            Line((37.681937895, 7.872122842), (18.477950078, 7.872122842))
            ThreePointArc((18.477950078, 7.872122842), (17.417289906, 8.31146267), (16.977950078, 9.372122842))
            Line((16.977950078, 9.372122842), (16.977950078, 15.872122842))
            ThreePointArc((16.977950078, 15.872122842), (17.417289906, 16.932783014), (18.477950078, 17.372122842))
        make_face(mode=Mode.SUBTRACT)
    extrude(amount=EXTRUDE_1_DEPTH)


solid = part.part
